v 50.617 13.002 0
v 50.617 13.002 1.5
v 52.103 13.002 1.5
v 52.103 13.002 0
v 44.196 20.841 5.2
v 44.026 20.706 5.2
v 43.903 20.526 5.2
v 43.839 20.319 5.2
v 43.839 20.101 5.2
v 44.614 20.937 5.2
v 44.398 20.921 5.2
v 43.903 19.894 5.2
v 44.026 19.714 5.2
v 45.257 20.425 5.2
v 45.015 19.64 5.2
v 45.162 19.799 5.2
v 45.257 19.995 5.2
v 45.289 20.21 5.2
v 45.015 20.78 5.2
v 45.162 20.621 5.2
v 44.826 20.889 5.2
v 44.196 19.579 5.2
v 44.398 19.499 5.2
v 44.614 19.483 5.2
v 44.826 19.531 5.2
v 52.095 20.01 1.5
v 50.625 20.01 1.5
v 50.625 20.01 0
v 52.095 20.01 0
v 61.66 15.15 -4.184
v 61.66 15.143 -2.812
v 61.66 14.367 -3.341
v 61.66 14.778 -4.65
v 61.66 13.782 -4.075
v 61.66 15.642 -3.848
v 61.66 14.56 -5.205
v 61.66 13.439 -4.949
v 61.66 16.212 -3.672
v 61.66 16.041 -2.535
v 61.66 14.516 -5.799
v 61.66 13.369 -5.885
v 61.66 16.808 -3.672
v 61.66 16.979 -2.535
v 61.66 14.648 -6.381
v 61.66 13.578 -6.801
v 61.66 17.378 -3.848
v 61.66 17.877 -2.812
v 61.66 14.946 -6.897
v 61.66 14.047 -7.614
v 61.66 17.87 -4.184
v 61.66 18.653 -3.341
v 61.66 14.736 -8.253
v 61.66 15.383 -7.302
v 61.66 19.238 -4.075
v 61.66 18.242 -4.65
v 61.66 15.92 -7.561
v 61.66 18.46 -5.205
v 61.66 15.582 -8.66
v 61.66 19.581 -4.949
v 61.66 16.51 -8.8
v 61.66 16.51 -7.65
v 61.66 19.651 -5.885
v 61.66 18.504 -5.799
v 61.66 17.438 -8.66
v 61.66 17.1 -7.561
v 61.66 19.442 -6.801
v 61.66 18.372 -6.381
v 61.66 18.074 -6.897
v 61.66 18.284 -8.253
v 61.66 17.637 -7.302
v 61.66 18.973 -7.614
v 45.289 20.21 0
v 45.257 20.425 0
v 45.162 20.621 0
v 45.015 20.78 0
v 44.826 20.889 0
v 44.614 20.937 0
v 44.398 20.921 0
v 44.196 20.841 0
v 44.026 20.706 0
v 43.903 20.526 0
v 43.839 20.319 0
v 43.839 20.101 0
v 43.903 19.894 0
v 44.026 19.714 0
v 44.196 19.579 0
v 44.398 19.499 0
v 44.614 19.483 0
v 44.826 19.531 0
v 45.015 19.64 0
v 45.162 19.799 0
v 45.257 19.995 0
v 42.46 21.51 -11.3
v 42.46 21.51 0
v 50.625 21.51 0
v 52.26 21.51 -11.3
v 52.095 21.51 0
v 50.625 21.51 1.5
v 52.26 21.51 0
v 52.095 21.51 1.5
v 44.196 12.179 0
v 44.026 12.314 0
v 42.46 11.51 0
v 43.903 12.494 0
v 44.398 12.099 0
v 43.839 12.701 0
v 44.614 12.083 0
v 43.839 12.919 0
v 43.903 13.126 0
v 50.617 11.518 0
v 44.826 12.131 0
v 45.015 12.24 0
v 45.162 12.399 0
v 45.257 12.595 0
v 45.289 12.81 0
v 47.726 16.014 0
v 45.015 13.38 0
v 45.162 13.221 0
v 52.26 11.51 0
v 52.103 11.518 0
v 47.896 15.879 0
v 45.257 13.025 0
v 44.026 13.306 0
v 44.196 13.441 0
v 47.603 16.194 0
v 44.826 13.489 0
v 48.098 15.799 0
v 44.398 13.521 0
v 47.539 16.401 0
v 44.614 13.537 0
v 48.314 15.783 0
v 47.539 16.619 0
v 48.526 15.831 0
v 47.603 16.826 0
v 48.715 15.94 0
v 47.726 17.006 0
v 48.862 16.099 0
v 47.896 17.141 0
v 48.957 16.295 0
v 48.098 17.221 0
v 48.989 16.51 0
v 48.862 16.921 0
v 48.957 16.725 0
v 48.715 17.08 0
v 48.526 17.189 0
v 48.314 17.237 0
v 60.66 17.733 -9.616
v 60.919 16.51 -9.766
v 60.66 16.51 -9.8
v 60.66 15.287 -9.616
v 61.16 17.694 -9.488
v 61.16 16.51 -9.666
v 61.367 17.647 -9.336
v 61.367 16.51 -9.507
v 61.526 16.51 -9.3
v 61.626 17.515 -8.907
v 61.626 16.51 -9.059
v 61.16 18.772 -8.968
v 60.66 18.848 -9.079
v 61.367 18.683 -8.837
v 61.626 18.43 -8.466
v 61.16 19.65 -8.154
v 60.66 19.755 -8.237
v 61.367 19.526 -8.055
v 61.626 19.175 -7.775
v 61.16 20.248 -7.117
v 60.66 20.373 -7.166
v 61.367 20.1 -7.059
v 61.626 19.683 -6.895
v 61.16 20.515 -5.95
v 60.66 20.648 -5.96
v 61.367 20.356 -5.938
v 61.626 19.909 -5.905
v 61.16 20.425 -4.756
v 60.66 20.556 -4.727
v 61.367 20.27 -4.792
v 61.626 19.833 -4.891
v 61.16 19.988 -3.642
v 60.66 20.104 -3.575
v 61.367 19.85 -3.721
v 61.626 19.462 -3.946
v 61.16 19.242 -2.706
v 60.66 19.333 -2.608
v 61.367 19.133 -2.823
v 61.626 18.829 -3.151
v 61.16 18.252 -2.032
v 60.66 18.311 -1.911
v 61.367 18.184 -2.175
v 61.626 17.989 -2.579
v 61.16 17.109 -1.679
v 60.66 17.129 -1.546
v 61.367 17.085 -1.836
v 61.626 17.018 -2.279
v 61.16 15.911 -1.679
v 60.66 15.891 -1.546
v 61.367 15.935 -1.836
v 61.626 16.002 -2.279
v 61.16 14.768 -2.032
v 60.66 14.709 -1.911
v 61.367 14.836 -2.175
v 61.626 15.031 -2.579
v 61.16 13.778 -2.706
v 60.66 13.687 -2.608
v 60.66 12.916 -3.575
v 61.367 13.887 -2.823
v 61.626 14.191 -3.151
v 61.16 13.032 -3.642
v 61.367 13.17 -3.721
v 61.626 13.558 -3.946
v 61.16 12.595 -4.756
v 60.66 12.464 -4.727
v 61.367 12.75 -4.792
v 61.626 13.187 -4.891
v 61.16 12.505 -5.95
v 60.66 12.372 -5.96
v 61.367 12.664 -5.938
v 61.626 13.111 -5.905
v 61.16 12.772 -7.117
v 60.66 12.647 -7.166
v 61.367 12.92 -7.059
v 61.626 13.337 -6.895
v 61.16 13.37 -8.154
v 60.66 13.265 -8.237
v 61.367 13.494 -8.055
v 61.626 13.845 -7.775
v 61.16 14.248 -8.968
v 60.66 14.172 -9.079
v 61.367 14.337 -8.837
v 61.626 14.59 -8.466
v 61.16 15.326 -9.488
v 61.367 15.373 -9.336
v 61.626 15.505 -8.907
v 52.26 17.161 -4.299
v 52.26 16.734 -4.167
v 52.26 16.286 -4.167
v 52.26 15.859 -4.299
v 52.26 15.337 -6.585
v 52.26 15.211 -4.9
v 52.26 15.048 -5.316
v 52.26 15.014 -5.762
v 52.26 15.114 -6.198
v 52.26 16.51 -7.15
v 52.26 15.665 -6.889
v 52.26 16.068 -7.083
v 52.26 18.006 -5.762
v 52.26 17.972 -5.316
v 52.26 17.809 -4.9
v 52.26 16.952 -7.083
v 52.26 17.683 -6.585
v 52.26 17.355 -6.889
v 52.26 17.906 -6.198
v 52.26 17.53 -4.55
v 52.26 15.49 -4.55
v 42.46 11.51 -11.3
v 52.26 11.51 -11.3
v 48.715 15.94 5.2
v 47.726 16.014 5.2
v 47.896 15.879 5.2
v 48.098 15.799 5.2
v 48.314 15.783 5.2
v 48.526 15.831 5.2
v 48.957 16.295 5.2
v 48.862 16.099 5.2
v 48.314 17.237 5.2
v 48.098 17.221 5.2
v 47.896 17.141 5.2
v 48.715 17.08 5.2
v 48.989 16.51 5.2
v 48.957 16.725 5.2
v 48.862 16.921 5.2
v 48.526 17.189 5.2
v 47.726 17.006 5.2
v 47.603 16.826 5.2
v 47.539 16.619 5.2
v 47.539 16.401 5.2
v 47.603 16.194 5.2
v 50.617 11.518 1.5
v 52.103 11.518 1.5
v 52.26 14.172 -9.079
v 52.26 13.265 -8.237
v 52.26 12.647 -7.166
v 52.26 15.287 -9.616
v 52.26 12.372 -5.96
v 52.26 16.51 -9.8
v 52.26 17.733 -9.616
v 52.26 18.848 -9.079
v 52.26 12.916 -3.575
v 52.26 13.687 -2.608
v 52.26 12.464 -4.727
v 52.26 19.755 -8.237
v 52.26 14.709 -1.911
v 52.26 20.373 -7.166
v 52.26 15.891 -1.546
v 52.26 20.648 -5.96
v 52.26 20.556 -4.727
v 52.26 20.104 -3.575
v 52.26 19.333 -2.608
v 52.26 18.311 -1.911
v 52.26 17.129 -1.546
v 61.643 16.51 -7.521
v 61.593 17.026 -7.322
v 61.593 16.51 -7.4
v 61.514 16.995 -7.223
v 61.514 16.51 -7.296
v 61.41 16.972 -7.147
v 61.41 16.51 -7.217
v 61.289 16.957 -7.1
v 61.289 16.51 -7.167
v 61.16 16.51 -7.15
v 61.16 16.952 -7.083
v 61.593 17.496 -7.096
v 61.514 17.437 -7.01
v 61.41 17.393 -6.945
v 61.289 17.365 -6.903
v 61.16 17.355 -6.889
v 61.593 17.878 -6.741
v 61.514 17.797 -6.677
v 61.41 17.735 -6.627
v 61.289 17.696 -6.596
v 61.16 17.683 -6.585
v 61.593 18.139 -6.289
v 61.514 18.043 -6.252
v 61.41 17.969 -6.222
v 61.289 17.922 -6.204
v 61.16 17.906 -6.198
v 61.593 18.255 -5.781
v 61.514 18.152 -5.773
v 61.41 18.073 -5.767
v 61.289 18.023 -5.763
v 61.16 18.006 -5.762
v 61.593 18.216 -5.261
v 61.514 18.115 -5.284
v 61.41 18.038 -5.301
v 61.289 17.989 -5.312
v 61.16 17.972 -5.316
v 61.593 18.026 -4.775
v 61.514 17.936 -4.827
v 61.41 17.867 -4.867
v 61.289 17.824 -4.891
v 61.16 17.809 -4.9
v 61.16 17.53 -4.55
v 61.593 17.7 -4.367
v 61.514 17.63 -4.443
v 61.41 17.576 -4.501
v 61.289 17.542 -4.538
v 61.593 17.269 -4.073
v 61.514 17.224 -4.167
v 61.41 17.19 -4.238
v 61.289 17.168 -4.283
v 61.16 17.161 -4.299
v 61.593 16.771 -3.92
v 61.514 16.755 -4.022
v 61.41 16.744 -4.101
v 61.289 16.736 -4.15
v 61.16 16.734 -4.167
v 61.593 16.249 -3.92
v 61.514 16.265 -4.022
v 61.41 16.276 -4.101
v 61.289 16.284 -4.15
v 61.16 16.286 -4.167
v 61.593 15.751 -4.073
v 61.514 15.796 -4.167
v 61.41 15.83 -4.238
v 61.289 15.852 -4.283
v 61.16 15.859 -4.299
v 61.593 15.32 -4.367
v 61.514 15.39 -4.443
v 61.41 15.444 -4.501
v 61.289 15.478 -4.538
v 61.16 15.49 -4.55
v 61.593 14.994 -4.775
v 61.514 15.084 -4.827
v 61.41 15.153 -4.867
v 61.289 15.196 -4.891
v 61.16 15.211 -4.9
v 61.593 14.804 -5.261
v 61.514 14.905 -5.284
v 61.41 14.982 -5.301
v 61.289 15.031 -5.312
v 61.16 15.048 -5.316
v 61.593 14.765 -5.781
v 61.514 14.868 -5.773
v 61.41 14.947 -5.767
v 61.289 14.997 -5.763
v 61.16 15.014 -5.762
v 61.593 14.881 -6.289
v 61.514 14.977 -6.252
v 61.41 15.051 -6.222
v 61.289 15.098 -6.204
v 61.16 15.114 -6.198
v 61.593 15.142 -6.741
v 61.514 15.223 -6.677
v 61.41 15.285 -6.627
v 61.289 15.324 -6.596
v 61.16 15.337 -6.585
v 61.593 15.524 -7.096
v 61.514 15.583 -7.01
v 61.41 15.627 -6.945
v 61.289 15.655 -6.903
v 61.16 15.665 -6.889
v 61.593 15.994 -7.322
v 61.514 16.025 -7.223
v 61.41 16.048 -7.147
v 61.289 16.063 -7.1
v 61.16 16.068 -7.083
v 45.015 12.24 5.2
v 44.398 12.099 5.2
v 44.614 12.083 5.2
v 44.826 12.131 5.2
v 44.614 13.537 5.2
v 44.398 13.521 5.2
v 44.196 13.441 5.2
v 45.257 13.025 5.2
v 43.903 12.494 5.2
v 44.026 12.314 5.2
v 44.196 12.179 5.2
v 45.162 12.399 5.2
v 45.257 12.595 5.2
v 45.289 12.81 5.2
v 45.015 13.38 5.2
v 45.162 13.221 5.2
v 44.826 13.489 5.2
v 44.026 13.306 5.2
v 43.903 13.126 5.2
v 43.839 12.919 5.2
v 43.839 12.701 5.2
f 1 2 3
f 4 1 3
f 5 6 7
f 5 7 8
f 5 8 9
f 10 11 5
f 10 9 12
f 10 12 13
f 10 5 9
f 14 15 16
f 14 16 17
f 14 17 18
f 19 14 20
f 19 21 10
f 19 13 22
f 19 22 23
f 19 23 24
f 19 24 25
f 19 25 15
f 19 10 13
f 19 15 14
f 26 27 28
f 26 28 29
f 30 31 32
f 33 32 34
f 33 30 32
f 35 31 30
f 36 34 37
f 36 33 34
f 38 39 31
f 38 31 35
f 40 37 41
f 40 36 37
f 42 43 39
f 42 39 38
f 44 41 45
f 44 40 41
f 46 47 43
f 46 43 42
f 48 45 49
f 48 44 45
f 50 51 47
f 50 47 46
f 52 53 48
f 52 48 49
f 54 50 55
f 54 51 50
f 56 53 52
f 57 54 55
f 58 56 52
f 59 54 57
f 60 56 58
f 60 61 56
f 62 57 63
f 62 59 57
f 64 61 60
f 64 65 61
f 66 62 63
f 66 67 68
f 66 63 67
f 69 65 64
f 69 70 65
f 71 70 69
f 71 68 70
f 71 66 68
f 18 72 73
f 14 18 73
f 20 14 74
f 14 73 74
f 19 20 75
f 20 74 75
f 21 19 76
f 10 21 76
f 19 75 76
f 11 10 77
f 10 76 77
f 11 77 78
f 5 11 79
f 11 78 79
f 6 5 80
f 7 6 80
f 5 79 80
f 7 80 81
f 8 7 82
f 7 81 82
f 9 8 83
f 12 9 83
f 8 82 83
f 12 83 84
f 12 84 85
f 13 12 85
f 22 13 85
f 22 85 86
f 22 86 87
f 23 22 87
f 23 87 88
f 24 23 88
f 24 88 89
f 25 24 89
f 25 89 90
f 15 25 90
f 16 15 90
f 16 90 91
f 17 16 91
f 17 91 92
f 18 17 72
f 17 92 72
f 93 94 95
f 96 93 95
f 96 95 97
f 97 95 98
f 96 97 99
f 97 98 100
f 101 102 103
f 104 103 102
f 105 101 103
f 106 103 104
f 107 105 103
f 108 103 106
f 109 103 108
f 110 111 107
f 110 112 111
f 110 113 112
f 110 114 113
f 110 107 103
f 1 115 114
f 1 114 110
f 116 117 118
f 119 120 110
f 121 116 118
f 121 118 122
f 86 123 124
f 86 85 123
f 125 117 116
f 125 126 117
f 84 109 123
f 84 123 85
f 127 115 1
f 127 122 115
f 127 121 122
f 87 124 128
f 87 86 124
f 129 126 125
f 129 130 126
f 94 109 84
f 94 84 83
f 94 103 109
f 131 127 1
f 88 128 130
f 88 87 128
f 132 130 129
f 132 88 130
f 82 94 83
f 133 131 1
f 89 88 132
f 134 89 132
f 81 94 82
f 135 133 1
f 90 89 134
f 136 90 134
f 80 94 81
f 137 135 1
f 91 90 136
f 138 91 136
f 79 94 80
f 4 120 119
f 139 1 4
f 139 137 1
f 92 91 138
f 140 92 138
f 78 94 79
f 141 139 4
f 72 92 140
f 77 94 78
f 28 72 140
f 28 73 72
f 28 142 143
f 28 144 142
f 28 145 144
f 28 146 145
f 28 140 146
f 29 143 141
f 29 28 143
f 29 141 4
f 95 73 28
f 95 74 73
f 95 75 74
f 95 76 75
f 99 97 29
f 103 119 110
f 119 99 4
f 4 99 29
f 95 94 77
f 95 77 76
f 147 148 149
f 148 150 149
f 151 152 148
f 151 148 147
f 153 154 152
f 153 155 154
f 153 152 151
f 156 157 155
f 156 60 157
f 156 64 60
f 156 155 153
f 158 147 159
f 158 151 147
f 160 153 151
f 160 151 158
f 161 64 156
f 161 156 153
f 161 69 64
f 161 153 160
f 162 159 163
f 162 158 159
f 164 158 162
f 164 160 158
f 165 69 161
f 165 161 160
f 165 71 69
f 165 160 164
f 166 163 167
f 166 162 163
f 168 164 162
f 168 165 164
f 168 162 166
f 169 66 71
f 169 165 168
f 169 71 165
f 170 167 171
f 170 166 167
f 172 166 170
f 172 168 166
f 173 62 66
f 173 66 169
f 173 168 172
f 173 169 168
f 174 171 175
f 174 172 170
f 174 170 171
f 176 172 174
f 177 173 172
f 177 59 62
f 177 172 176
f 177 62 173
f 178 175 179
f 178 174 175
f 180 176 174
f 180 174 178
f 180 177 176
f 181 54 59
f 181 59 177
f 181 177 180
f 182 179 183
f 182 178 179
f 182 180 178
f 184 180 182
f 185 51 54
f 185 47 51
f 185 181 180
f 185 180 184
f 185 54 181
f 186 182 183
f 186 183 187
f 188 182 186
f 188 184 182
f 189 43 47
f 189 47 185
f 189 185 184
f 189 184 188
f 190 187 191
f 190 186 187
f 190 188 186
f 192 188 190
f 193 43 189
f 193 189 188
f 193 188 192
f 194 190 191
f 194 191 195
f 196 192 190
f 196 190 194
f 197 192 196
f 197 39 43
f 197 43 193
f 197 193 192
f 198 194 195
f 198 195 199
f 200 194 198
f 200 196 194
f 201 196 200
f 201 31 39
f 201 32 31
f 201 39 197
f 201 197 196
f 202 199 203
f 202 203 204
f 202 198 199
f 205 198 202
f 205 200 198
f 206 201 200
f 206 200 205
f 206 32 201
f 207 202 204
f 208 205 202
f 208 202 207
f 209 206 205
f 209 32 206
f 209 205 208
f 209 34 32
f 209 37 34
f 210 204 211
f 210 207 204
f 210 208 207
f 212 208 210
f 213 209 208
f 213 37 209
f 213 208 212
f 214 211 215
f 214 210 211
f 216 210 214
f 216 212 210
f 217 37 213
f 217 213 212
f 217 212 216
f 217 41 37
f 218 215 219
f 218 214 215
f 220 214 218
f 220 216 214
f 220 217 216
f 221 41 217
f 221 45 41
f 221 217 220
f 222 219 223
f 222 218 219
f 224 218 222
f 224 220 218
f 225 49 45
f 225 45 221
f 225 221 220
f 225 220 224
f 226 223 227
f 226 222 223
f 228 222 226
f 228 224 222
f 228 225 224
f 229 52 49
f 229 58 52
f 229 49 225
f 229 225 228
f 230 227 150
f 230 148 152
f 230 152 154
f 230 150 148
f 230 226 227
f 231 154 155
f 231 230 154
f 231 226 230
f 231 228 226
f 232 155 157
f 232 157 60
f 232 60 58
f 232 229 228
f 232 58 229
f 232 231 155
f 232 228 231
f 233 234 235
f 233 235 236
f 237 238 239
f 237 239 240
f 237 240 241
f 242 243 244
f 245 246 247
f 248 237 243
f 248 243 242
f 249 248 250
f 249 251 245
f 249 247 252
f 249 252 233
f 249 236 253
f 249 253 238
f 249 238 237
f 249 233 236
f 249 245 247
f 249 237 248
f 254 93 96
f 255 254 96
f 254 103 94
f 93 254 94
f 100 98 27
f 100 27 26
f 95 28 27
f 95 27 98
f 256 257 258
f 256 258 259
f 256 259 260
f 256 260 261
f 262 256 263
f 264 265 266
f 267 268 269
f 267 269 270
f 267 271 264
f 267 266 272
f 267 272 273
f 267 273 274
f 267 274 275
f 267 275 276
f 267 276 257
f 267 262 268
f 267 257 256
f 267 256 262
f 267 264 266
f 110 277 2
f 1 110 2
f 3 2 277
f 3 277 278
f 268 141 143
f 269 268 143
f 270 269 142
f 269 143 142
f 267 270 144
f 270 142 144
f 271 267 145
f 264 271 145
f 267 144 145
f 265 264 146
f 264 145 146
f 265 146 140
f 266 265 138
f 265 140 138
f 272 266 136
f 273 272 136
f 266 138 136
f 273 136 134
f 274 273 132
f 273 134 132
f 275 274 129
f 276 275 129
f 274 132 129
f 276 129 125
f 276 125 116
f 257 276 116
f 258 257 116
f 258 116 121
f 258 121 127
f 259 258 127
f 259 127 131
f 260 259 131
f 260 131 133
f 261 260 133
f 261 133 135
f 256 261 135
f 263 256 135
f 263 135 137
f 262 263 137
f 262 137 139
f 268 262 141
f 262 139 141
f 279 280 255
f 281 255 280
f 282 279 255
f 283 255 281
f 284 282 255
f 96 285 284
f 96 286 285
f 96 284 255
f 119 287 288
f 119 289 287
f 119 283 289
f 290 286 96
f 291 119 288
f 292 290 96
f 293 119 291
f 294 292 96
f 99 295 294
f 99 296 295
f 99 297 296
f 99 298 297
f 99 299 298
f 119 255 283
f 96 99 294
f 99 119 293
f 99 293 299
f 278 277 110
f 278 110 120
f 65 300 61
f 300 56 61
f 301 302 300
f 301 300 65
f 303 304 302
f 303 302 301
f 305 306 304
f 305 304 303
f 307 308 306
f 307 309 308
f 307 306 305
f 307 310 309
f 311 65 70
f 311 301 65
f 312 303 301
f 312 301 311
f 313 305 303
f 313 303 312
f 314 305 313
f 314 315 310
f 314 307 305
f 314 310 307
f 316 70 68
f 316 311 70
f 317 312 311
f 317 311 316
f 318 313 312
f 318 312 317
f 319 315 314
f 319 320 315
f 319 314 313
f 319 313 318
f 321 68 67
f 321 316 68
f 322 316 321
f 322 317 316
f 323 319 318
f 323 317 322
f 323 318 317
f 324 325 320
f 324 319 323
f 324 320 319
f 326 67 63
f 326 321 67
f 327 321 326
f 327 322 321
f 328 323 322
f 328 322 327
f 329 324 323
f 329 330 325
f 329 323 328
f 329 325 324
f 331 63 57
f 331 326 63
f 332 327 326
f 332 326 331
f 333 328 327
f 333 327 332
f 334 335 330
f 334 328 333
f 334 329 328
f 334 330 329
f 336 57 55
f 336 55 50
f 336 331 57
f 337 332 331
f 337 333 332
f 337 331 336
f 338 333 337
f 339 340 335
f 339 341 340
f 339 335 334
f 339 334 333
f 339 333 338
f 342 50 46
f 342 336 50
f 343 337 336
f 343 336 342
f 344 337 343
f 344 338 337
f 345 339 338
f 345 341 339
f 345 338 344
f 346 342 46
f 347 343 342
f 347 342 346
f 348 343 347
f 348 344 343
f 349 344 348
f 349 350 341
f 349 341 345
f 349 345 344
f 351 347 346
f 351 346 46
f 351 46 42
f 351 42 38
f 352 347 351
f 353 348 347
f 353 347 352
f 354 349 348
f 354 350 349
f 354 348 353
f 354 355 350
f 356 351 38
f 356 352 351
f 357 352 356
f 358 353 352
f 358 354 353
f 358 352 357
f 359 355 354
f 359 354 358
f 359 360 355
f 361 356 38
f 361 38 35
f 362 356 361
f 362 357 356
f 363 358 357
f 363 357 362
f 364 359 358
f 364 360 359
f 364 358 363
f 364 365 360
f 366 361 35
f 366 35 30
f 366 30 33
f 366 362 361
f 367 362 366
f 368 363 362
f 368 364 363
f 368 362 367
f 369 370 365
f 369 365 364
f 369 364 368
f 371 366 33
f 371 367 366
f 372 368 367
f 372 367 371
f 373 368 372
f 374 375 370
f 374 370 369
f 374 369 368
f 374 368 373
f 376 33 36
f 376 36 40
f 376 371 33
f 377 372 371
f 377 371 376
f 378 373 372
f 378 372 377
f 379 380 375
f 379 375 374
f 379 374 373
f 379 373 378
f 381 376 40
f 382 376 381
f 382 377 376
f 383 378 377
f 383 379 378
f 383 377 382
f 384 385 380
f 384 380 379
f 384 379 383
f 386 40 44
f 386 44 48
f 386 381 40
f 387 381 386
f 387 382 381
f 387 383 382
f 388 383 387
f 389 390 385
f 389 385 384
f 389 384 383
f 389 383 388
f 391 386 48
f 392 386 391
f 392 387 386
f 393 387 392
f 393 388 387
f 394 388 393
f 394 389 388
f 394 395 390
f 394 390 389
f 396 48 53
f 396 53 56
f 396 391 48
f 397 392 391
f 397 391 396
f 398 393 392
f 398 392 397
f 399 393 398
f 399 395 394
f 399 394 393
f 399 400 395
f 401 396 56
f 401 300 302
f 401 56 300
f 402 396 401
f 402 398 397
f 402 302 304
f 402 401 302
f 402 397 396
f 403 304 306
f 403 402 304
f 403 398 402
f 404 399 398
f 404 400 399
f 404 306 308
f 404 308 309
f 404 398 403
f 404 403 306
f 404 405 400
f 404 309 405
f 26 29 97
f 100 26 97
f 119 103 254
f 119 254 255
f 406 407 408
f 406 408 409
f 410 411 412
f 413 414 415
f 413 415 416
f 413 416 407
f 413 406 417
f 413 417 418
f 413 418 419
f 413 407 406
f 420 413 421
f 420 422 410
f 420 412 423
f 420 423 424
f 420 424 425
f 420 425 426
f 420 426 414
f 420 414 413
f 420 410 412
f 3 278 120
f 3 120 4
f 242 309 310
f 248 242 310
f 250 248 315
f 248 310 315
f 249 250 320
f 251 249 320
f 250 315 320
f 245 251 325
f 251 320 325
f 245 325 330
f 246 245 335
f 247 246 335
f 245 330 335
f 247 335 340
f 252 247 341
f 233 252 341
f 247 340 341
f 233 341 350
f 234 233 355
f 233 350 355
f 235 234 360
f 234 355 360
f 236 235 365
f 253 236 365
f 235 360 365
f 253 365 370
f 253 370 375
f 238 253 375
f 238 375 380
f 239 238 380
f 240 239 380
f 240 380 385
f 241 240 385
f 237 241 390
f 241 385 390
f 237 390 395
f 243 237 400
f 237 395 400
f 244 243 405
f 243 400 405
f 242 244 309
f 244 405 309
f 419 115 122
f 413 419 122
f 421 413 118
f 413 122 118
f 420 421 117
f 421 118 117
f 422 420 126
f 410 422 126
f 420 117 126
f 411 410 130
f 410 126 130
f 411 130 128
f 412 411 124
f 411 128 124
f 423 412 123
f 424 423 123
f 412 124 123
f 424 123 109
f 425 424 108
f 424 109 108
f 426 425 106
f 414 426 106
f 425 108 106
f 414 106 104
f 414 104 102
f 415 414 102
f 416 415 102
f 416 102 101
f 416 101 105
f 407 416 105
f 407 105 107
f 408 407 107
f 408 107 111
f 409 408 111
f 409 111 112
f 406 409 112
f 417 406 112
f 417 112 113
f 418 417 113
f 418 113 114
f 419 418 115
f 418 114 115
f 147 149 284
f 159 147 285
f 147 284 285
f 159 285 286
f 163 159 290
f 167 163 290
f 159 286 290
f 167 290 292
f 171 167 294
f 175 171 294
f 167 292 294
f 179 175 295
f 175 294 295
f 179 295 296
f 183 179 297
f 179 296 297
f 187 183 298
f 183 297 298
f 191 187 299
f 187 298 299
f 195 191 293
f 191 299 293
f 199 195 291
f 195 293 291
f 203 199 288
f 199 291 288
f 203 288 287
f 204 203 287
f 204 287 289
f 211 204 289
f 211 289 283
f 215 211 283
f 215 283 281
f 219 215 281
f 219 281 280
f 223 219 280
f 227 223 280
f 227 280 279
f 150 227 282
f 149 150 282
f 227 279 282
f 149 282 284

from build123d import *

# Parameters (mm, degrees)
SKETCH5_R             = 0.729
BOSS_EXTRUDE1_DEPTH   = 5.2
BOSS_EXTRUDE1_2_DEPTH = 5.2
BOSS_EXTRUDE1_3_DEPTH = 5.2
SKETCH6_W             = 9.8
SKETCH6_H             = 10
BOSS_EXTRUDE2_DEPTH   = 11.3
SKETCH8_R             = 4.15
BOSS_EXTRUDE3_DEPTH   = 9.4
SKETCH9_R             = 1.5
CUT_EXTRUDE1_DEPTH    = 9.4
FILLET1_R             = 1
FILLET2_R             = 0.5
SKETCH10_W            = 1.469693846
SKETCH10_H            = 1.5
SKETCH10_W_2          = 1.486314294
SKETCH10_H_2          = 1.483532886
BOSS_EXTRUDE4_DEPTH   = 1.5


with BuildPart() as part:
    # Sketch5 → Boss-Extrude1 (new body)
    with BuildSketch(Plane.XY):
        with Locations((44.56, 20.21)):
            Circle(SKETCH5_R)
    extrude(amount=BOSS_EXTRUDE1_DEPTH)



with BuildPart() as body_2:
    # Sketch5 → Boss-Extrude1 2 (new body)
    with BuildSketch(Plane.XY):
        with Locations((44.56, 12.81)):
            Circle(SKETCH5_R)
    extrude(amount=BOSS_EXTRUDE1_2_DEPTH)


with BuildPart() as body_3:
    # Sketch5 → Boss-Extrude1 3 (new body)
    with BuildSketch(Plane.XY):
        with Locations((48.26, 16.51)):
            Circle(SKETCH5_R)
    extrude(amount=BOSS_EXTRUDE1_3_DEPTH)


with BuildPart() as part_1:
    add(part.part)

    add(body_2.part)  # Boss-Extrude2 merges body 2

    add(body_3.part)  # Boss-Extrude2 merges body 3
    # Sketch6 → Boss-Extrude2 (add)
    with BuildSketch(Plane.XY):
        with Locations((47.36, 16.51)):
            Rectangle(SKETCH6_W, SKETCH6_H)
    extrude(amount=-BOSS_EXTRUDE2_DEPTH)

    # Sketch8 → Boss-Extrude3 (add)
    with BuildSketch(Plane(origin=(52.26, 0, 0), x_dir=(0, 0, -1), z_dir=(1, 0, 0))):
        with Locations((5.65, 16.51)):
            Circle(SKETCH8_R)
    extrude(amount=BOSS_EXTRUDE3_DEPTH)

    # Sketch9 → Cut-Extrude1 (cut)
    with BuildSketch(Plane(origin=(61.66, 0, 0), x_dir=(0, 0, -1), z_dir=(1, 0, 0))):
        with Locations((5.65, 16.51)):
            Circle(SKETCH9_R)
    extrude(amount=-CUT_EXTRUDE1_DEPTH, mode=Mode.SUBTRACT)

    # Fillet1
    fillet1_edges = [part_1.edges().sort_by_distance(p)[0] for p in [
        (61.66, 16.51, -1.5),
    ]]
    fillet(fillet1_edges, radius=FILLET1_R)

    # Fillet2
    fillet2_edges = [part_1.edges().sort_by_distance(p)[0] for p in [
        (61.66, 16.51, -4.15),
    ]]
    fillet(fillet2_edges, radius=FILLET2_R)

    # Sketch10 → Boss-Extrude4 (add)
    with BuildSketch(Plane.XY):
        with Locations((51.36, 20.76)):
            Rectangle(SKETCH10_W, SKETCH10_H)
        with Locations((51.36, 12.26)):
            Rectangle(SKETCH10_W_2, SKETCH10_H_2)
    extrude(amount=BOSS_EXTRUDE4_DEPTH)


solid = part_1.part
